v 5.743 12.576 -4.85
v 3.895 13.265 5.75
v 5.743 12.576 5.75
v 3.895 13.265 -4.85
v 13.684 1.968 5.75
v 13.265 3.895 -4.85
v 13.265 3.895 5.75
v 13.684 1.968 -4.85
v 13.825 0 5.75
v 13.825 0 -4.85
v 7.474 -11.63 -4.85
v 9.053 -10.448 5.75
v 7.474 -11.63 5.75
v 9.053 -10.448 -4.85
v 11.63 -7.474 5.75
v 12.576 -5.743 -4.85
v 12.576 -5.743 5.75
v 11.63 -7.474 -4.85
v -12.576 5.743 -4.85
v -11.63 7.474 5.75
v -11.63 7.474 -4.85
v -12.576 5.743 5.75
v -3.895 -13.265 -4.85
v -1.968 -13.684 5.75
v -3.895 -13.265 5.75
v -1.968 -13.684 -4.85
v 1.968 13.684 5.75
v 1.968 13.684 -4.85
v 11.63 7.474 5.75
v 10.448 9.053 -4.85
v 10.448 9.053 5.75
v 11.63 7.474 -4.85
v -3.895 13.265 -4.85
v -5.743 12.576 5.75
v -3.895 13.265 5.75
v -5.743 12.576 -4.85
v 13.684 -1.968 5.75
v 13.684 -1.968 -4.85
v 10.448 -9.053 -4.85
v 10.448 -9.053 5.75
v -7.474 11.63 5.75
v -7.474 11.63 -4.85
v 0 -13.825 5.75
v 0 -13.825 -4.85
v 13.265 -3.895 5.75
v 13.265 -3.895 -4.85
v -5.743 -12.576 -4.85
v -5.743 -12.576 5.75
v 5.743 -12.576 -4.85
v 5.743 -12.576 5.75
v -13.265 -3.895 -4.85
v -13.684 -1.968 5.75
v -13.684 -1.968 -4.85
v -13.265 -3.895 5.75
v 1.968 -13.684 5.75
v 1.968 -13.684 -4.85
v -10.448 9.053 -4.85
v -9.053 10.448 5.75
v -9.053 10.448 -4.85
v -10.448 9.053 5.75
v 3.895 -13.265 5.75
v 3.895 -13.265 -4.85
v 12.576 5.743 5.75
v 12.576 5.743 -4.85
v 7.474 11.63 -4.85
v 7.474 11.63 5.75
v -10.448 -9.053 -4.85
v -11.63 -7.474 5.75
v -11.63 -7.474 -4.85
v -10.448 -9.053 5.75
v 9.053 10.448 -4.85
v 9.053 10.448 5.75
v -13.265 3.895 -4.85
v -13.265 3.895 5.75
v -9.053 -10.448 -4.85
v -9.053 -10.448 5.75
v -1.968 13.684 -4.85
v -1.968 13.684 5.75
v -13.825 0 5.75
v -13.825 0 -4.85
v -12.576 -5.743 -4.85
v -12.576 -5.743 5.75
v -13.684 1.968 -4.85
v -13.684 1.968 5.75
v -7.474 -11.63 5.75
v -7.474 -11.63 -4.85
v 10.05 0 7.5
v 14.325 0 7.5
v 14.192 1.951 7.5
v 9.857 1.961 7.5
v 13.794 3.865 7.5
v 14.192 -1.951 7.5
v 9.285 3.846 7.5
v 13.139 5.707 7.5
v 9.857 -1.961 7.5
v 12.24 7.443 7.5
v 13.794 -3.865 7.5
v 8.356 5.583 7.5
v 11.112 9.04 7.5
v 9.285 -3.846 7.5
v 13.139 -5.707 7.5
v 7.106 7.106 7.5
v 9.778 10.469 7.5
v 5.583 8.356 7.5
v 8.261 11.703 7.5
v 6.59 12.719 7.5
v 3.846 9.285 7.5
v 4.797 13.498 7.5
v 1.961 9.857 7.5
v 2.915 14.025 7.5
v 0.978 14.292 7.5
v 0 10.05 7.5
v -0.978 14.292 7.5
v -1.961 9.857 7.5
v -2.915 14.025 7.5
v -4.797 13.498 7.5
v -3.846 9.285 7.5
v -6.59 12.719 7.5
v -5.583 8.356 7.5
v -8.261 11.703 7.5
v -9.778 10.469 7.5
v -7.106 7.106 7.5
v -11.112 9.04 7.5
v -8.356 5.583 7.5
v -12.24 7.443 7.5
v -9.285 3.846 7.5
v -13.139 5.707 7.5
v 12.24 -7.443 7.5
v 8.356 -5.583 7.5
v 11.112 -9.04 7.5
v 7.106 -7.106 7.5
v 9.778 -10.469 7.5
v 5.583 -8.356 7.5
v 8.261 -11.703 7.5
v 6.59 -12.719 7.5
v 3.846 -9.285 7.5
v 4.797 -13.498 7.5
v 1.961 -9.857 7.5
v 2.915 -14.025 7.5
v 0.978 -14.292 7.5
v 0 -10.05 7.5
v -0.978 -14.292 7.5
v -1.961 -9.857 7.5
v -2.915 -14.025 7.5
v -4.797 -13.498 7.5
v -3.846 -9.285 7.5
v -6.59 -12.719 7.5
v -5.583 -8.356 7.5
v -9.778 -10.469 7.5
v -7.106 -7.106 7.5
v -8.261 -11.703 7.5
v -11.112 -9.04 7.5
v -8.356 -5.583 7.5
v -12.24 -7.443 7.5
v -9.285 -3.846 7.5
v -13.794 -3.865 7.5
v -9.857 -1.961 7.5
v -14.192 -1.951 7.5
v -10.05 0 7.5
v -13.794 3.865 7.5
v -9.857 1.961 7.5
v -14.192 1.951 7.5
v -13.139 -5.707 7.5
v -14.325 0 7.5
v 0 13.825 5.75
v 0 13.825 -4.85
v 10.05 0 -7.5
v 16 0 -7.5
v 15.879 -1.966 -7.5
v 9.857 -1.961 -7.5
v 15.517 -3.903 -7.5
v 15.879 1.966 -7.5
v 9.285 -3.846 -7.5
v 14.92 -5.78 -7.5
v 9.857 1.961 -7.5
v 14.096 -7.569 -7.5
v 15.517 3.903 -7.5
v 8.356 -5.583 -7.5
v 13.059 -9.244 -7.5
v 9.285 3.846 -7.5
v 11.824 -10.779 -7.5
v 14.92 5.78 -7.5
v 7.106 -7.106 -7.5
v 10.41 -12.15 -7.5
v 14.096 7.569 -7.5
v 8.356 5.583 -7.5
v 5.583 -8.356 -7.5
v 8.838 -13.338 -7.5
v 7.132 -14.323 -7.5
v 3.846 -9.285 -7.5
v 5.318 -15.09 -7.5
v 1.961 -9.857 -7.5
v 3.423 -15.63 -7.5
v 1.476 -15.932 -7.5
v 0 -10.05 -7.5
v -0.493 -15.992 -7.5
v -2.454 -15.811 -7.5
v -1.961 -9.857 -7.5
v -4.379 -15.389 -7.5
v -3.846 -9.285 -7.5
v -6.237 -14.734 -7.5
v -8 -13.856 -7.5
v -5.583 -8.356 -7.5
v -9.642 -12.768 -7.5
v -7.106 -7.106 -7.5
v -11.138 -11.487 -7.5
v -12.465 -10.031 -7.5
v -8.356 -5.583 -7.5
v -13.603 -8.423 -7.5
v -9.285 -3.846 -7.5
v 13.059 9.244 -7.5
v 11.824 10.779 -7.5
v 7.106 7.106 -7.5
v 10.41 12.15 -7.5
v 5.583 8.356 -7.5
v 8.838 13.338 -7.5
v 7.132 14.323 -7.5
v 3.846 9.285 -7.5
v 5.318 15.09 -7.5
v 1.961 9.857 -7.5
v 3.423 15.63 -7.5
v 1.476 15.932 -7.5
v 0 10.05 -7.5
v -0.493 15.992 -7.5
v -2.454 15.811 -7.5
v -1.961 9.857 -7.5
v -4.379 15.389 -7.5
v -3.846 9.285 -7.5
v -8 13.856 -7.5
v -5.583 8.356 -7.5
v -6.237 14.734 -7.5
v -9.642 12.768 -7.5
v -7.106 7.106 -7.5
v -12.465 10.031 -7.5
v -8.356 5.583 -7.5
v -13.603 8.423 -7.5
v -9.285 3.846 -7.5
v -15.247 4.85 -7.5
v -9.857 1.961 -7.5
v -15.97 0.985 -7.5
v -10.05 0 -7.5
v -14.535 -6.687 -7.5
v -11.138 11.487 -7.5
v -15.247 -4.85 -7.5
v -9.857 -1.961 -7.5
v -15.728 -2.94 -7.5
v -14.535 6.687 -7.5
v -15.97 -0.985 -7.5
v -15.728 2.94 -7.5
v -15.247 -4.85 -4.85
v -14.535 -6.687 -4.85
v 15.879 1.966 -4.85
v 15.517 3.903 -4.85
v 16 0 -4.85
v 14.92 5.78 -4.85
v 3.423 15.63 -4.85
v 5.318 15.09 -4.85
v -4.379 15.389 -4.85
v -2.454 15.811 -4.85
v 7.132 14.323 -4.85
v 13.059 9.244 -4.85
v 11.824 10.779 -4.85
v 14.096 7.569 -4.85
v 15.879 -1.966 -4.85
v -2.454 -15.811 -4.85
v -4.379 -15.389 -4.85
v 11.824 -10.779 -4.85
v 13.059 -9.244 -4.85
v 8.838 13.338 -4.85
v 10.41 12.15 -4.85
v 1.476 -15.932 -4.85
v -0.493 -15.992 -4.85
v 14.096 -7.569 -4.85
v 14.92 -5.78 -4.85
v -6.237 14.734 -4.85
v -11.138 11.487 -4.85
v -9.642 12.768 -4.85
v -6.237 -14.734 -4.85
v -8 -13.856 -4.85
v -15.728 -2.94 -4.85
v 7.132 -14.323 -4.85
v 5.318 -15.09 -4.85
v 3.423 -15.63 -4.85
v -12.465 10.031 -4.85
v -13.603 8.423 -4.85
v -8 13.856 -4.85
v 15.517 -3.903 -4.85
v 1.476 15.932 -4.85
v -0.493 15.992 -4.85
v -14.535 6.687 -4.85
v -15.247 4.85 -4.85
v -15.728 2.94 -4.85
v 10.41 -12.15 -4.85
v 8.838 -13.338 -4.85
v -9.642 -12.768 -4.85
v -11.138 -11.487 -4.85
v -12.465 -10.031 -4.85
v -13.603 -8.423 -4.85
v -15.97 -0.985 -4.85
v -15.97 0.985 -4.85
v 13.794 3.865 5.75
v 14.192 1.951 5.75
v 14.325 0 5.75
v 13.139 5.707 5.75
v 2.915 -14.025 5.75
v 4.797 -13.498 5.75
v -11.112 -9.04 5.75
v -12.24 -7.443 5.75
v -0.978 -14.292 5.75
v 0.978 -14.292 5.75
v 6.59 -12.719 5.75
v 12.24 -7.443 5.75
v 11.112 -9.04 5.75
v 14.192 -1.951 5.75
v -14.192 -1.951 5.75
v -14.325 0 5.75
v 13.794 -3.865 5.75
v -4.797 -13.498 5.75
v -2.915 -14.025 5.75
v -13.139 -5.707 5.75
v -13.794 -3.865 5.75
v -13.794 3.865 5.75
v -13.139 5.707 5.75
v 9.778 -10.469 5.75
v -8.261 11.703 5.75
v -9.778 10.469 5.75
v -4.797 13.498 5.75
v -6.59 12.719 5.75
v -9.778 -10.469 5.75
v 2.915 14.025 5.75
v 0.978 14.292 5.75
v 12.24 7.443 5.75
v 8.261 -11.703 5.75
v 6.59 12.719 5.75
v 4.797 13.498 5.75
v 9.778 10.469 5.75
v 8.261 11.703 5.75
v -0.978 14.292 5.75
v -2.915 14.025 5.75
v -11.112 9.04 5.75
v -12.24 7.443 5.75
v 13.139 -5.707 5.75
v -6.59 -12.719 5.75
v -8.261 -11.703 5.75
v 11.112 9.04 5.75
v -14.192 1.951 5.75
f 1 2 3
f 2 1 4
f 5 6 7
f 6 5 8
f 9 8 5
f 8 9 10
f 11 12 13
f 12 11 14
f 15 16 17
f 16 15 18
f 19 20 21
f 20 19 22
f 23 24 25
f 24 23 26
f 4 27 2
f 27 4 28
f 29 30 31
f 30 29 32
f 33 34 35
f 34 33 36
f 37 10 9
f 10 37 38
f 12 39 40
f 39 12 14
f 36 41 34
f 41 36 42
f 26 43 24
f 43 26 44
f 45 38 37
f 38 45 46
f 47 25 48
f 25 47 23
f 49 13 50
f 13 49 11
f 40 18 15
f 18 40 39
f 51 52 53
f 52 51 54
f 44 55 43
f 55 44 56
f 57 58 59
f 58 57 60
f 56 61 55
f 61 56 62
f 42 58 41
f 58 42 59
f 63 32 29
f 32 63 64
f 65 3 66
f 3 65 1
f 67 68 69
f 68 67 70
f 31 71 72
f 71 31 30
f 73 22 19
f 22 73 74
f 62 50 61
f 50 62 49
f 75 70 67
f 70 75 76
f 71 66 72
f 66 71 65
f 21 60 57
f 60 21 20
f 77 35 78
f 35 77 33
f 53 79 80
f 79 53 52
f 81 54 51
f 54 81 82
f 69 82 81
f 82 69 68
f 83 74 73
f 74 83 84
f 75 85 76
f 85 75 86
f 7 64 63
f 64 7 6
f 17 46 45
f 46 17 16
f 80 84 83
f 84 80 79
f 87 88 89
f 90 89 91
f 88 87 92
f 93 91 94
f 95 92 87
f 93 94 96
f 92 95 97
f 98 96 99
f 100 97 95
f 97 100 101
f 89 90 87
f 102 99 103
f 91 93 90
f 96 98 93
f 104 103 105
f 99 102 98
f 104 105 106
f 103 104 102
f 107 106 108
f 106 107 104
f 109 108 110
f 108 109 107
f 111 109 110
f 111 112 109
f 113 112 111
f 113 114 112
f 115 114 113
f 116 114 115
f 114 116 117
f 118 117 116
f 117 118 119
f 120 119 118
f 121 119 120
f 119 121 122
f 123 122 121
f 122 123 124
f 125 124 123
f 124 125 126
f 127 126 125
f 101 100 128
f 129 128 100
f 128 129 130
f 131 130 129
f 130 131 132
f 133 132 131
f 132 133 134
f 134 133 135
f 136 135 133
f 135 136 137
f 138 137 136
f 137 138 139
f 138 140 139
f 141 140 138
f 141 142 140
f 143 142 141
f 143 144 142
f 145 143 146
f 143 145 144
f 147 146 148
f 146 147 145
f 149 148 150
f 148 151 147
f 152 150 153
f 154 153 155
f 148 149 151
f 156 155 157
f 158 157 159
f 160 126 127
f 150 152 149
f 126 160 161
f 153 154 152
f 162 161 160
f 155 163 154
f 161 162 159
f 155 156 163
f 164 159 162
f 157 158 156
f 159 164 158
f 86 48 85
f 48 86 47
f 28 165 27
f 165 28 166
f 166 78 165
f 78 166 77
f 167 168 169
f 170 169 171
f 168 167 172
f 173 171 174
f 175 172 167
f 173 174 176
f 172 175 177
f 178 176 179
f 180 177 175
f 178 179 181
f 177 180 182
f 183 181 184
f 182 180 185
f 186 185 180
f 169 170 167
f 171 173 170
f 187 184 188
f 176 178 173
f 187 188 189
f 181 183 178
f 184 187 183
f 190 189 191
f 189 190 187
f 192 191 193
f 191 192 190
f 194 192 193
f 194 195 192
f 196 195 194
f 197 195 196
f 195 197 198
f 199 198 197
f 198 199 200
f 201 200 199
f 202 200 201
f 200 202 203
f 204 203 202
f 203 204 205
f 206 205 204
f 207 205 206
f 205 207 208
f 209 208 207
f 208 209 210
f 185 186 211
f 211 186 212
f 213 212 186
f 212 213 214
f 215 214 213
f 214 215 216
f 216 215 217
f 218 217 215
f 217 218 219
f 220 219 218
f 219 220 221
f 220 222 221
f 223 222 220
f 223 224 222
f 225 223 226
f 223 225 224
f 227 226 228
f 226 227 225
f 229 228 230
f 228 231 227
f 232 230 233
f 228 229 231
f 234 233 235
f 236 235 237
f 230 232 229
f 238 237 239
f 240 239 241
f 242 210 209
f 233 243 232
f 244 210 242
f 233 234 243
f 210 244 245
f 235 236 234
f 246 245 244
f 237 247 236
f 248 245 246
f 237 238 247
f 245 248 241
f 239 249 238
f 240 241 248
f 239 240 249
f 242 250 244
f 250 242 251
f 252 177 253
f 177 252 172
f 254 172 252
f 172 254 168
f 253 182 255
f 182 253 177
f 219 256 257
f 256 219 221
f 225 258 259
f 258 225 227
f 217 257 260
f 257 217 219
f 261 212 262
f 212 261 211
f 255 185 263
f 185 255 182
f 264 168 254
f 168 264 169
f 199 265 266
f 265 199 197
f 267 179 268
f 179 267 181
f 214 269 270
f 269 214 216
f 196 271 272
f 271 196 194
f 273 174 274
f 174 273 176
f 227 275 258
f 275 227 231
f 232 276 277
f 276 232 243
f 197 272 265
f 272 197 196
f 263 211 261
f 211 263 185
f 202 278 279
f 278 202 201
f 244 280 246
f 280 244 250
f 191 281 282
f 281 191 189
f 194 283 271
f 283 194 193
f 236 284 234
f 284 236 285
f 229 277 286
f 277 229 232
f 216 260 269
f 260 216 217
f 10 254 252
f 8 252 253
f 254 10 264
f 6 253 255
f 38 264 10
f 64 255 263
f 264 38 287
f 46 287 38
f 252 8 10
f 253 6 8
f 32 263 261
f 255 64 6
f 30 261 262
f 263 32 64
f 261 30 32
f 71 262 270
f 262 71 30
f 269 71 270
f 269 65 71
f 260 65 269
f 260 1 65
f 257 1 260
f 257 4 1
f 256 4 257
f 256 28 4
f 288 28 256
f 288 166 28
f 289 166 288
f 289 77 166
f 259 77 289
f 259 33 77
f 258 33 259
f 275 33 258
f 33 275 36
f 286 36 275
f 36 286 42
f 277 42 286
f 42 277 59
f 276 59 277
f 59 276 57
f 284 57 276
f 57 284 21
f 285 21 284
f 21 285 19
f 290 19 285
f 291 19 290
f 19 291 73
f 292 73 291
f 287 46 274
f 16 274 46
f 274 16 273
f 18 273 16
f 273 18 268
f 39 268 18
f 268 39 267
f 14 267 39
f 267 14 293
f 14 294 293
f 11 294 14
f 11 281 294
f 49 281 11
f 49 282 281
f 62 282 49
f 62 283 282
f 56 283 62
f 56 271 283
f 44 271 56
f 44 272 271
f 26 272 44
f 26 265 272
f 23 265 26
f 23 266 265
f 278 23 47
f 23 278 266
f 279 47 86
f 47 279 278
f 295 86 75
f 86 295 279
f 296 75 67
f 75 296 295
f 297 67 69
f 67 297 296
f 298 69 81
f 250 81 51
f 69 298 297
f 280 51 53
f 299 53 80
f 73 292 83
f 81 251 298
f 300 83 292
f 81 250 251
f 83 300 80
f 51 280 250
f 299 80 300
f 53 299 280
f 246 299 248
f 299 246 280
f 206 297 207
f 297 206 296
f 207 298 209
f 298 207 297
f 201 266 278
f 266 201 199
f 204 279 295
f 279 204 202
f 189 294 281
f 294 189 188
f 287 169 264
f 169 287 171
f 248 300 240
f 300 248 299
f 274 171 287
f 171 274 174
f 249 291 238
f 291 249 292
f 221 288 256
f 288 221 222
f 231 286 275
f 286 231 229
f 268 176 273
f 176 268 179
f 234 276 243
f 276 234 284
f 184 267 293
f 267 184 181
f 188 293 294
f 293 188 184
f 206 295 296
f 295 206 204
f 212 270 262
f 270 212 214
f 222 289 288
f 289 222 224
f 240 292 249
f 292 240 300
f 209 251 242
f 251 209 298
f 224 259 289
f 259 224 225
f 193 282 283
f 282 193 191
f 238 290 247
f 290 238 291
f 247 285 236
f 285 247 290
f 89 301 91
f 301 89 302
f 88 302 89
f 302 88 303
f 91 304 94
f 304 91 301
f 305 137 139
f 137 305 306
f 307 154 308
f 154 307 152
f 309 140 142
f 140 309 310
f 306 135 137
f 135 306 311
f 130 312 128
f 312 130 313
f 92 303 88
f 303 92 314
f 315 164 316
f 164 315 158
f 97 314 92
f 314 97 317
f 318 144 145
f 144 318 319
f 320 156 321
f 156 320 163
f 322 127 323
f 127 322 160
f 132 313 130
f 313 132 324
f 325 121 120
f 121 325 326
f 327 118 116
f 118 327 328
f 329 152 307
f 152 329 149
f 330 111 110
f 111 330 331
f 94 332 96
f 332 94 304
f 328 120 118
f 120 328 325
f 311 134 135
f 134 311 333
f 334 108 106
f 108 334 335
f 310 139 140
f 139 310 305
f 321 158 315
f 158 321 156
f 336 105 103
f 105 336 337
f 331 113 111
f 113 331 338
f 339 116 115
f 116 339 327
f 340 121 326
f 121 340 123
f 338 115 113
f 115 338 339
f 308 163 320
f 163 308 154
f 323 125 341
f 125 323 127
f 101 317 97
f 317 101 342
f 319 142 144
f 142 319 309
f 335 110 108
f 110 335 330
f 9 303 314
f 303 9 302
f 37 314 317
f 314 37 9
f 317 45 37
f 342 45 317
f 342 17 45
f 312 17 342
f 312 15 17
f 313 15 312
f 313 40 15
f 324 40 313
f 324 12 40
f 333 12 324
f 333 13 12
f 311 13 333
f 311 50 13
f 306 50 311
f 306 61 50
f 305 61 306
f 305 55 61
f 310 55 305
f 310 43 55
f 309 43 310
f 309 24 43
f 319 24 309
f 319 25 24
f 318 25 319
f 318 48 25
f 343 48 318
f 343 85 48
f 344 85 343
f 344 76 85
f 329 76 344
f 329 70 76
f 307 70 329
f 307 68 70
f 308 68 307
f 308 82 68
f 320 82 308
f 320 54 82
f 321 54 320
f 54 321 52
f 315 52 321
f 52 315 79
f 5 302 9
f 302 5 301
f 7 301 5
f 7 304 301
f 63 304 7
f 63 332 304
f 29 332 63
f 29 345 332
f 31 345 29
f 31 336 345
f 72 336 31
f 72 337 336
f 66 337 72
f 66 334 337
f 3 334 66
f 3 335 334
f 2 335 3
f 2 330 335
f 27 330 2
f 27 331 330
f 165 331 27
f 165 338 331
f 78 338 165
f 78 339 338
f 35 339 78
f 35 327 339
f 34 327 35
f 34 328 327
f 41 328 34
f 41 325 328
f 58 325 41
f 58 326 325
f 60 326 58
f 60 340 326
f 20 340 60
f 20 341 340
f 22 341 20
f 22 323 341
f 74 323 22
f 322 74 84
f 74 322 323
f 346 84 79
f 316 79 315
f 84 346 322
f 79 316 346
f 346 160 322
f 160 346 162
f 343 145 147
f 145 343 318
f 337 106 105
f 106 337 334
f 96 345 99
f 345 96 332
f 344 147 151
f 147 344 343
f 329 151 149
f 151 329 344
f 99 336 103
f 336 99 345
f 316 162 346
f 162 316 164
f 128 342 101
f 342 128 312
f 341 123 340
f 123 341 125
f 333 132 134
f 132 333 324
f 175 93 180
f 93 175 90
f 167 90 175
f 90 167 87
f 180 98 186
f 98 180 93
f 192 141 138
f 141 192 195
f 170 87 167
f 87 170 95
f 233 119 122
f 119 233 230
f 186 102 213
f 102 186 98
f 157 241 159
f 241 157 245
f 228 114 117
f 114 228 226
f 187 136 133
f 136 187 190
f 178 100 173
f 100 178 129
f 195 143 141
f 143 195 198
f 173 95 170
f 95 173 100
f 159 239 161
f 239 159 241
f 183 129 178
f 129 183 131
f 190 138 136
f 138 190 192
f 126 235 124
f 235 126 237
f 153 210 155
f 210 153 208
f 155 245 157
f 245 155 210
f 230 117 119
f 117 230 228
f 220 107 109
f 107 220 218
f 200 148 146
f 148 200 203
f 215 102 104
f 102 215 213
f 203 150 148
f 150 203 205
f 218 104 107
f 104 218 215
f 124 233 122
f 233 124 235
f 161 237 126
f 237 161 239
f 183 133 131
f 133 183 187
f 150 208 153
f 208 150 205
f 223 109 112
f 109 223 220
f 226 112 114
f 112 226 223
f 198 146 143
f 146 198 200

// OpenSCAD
// file: spacerUtils.scad
/**
 * @file spacerUtils.scad
 *
 * @version 1.0
 *
 * @author Calum Judd Anderson
 *
 * @brief Aprilia RS 125 2006-2011 spacer utilities
 */
$fa = 0.01;

INTERFERENCE_FIT = 0.001;
SLIDE_FIT = 0.05;

SPROCKET_CARRIER_SPACER_HEIGHT = 17;
BRAKE_CARRIER_SPACER_HEIGHT = 15.25;

REAR_SPACER_OUT_RADIUS = 15;
SPINDLE_RADIUS = 10;
SWINGING_ARM_FACE_RADIUS = 17.5;
SWINGING_ARM_FACE_HEIGHT = 5;

CAPTIVE_LIP_HEIGHT = 1.75;
CAPTIVE_LIP_RADIUS_ADD = 0.5;
REAR_CAPTIVE_LIP_RADIUS = REAR_SPACER_OUT_RADIUS + CAPTIVE_LIP_RADIUS_ADD;

SPROCKET_CARRIER_INNER_BEARING_SPACER_HEIGHT = 16.5;

SPROCKET_CARRIER_INNER_BEARING_OUTER_RADIUS = 12.475;
SPROCKET_CARRIER_INNER_BEARING_FACE_RADIUS = 16;
SPROCKET_CARRIER_INNER_BEARING_FACE_HEIGHT = 5.55;

FRONT_SPACER_HEIGHT = 15;
FRONT_SPACER_OUT_RADIUS = 13.825;
FRONT_CAPTIVE_LIP_RADIUS = FRONT_SPACER_OUT_RADIUS + CAPTIVE_LIP_RADIUS_ADD;
FRONT_FORK_FACE_RADIUS = 16;
FRONT_FORK_FACE_HEIGHT = 2.65;

/**
 * @brief Aprilia RS 125 2006-2011 rear brake carrier side spacer with captive flange
 */
module brakeCarrierSpacer() {
    difference() {
        union() {
            cylinder(BRAKE_CARRIER_SPACER_HEIGHT, REAR_SPACER_OUT_RADIUS, REAR_SPACER_OUT_RADIUS, center=true);
            translate([0, 0, (-(BRAKE_CARRIER_SPACER_HEIGHT -SWINGING_ARM_FACE_HEIGHT)/2)])
                cylinder(SWINGING_ARM_FACE_HEIGHT, SWINGING_ARM_FACE_RADIUS, SWINGING_ARM_FACE_RADIUS, center=true);
            translate([0, 0, ((BRAKE_CARRIER_SPACER_HEIGHT - CAPTIVE_LIP_HEIGHT)/2)])
                cylinder(CAPTIVE_LIP_HEIGHT, REAR_CAPTIVE_LIP_RADIUS, REAR_CAPTIVE_LIP_RADIUS, center=true);
        }
        cylinder(BRAKE_CARRIER_SPACER_HEIGHT + INTERFERENCE_FIT, SPINDLE_RADIUS + SLIDE_FIT, SPINDLE_RADIUS + SLIDE_FIT, center=true);
    }
}


/**
 * @brief Aprilia RS 125 2006-2011 front spacer with captive flange
 */
module frontSpacer() {
    difference() {
        union() {
            cylinder(FRONT_SPACER_HEIGHT, FRONT_SPACER_OUT_RADIUS, FRONT_SPACER_OUT_RADIUS, center=true);
            translate([0, 0, (-(FRONT_SPACER_HEIGHT -FRONT_FORK_FACE_HEIGHT)/2)])
                cylinder(FRONT_FORK_FACE_HEIGHT, FRONT_FORK_FACE_RADIUS, FRONT_FORK_FACE_RADIUS, center=true);
            translate([0, 0, ((FRONT_SPACER_HEIGHT - CAPTIVE_LIP_HEIGHT)/2)])
                cylinder(CAPTIVE_LIP_HEIGHT, FRONT_CAPTIVE_LIP_RADIUS, FRONT_CAPTIVE_LIP_RADIUS, center=true);
        }
        cylinder(FRONT_SPACER_HEIGHT + INTERFERENCE_FIT, SPINDLE_RADIUS + SLIDE_FIT, SPINDLE_RADIUS + SLIDE_FIT, center=true);
    }
}

/**
 * @brief Aprilia RS 125 2006-2011 rear sprocket carrier side internal spacer
 */
module sprocketCarrierInnerBearingSpacer() {
    difference() {
        union() {
            cylinder(SPROCKET_CARRIER_INNER_BEARING_SPACER_HEIGHT, SPROCKET_CARRIER_INNER_BEARING_OUTER_RADIUS, SPROCKET_CARRIER_INNER_BEARING_OUTER_RADIUS, center=true);
            translate([0, 0, (-(SPROCKET_CARRIER_INNER_BEARING_SPACER_HEIGHT -SPROCKET_CARRIER_INNER_BEARING_FACE_HEIGHT)/2)])
                cylinder(SPROCKET_CARRIER_INNER_BEARING_FACE_HEIGHT, SPROCKET_CARRIER_INNER_BEARING_FACE_RADIUS, SPROCKET_CARRIER_INNER_BEARING_FACE_RADIUS, center=true);
        }
        cylinder(SPROCKET_CARRIER_INNER_BEARING_SPACER_HEIGHT + INTERFERENCE_FIT, SPINDLE_RADIUS + SLIDE_FIT, SPINDLE_RADIUS + SLIDE_FIT, center=true);
    }
}

/**
 * @brief Aprilia RS 125 2006-2011 rear sprocket carrier side spacer with captive flange
 */
module sprocketCarrierSpacer() {
    difference() {
        union() {
            cylinder(SPROCKET_CARRIER_SPACER_HEIGHT, REAR_SPACER_OUT_RADIUS, REAR_SPACER_OUT_RADIUS, center=true);
            translate([0, 0, (-(SPROCKET_CARRIER_SPACER_HEIGHT -SWINGING_ARM_FACE_HEIGHT)/2)])
                cylinder(SWINGING_ARM_FACE_HEIGHT, SWINGING_ARM_FACE_RADIUS, SWINGING_ARM_FACE_RADIUS, center=true);
            translate([0, 0, ((SPROCKET_CARRIER_SPACER_HEIGHT - CAPTIVE_LIP_HEIGHT)/2)])
                cylinder(CAPTIVE_LIP_HEIGHT, REAR_CAPTIVE_LIP_RADIUS, REAR_CAPTIVE_LIP_RADIUS, center=true);
        }
        cylinder(SPROCKET_CARRIER_SPACER_HEIGHT + INTERFERENCE_FIT, SPINDLE_RADIUS + SLIDE_FIT, SPINDLE_RADIUS + SLIDE_FIT, center=true);
    }
}
// main file
/**
 * @file frontSpacer.scad
 *
 * @version 1.0
 *
 * @author Calum Judd Anderson
 *
 * @brief Aprilia RS 125 2006-2011 front wheel spacer
 */
include <spacerUtils.scad>

frontSpacer();
